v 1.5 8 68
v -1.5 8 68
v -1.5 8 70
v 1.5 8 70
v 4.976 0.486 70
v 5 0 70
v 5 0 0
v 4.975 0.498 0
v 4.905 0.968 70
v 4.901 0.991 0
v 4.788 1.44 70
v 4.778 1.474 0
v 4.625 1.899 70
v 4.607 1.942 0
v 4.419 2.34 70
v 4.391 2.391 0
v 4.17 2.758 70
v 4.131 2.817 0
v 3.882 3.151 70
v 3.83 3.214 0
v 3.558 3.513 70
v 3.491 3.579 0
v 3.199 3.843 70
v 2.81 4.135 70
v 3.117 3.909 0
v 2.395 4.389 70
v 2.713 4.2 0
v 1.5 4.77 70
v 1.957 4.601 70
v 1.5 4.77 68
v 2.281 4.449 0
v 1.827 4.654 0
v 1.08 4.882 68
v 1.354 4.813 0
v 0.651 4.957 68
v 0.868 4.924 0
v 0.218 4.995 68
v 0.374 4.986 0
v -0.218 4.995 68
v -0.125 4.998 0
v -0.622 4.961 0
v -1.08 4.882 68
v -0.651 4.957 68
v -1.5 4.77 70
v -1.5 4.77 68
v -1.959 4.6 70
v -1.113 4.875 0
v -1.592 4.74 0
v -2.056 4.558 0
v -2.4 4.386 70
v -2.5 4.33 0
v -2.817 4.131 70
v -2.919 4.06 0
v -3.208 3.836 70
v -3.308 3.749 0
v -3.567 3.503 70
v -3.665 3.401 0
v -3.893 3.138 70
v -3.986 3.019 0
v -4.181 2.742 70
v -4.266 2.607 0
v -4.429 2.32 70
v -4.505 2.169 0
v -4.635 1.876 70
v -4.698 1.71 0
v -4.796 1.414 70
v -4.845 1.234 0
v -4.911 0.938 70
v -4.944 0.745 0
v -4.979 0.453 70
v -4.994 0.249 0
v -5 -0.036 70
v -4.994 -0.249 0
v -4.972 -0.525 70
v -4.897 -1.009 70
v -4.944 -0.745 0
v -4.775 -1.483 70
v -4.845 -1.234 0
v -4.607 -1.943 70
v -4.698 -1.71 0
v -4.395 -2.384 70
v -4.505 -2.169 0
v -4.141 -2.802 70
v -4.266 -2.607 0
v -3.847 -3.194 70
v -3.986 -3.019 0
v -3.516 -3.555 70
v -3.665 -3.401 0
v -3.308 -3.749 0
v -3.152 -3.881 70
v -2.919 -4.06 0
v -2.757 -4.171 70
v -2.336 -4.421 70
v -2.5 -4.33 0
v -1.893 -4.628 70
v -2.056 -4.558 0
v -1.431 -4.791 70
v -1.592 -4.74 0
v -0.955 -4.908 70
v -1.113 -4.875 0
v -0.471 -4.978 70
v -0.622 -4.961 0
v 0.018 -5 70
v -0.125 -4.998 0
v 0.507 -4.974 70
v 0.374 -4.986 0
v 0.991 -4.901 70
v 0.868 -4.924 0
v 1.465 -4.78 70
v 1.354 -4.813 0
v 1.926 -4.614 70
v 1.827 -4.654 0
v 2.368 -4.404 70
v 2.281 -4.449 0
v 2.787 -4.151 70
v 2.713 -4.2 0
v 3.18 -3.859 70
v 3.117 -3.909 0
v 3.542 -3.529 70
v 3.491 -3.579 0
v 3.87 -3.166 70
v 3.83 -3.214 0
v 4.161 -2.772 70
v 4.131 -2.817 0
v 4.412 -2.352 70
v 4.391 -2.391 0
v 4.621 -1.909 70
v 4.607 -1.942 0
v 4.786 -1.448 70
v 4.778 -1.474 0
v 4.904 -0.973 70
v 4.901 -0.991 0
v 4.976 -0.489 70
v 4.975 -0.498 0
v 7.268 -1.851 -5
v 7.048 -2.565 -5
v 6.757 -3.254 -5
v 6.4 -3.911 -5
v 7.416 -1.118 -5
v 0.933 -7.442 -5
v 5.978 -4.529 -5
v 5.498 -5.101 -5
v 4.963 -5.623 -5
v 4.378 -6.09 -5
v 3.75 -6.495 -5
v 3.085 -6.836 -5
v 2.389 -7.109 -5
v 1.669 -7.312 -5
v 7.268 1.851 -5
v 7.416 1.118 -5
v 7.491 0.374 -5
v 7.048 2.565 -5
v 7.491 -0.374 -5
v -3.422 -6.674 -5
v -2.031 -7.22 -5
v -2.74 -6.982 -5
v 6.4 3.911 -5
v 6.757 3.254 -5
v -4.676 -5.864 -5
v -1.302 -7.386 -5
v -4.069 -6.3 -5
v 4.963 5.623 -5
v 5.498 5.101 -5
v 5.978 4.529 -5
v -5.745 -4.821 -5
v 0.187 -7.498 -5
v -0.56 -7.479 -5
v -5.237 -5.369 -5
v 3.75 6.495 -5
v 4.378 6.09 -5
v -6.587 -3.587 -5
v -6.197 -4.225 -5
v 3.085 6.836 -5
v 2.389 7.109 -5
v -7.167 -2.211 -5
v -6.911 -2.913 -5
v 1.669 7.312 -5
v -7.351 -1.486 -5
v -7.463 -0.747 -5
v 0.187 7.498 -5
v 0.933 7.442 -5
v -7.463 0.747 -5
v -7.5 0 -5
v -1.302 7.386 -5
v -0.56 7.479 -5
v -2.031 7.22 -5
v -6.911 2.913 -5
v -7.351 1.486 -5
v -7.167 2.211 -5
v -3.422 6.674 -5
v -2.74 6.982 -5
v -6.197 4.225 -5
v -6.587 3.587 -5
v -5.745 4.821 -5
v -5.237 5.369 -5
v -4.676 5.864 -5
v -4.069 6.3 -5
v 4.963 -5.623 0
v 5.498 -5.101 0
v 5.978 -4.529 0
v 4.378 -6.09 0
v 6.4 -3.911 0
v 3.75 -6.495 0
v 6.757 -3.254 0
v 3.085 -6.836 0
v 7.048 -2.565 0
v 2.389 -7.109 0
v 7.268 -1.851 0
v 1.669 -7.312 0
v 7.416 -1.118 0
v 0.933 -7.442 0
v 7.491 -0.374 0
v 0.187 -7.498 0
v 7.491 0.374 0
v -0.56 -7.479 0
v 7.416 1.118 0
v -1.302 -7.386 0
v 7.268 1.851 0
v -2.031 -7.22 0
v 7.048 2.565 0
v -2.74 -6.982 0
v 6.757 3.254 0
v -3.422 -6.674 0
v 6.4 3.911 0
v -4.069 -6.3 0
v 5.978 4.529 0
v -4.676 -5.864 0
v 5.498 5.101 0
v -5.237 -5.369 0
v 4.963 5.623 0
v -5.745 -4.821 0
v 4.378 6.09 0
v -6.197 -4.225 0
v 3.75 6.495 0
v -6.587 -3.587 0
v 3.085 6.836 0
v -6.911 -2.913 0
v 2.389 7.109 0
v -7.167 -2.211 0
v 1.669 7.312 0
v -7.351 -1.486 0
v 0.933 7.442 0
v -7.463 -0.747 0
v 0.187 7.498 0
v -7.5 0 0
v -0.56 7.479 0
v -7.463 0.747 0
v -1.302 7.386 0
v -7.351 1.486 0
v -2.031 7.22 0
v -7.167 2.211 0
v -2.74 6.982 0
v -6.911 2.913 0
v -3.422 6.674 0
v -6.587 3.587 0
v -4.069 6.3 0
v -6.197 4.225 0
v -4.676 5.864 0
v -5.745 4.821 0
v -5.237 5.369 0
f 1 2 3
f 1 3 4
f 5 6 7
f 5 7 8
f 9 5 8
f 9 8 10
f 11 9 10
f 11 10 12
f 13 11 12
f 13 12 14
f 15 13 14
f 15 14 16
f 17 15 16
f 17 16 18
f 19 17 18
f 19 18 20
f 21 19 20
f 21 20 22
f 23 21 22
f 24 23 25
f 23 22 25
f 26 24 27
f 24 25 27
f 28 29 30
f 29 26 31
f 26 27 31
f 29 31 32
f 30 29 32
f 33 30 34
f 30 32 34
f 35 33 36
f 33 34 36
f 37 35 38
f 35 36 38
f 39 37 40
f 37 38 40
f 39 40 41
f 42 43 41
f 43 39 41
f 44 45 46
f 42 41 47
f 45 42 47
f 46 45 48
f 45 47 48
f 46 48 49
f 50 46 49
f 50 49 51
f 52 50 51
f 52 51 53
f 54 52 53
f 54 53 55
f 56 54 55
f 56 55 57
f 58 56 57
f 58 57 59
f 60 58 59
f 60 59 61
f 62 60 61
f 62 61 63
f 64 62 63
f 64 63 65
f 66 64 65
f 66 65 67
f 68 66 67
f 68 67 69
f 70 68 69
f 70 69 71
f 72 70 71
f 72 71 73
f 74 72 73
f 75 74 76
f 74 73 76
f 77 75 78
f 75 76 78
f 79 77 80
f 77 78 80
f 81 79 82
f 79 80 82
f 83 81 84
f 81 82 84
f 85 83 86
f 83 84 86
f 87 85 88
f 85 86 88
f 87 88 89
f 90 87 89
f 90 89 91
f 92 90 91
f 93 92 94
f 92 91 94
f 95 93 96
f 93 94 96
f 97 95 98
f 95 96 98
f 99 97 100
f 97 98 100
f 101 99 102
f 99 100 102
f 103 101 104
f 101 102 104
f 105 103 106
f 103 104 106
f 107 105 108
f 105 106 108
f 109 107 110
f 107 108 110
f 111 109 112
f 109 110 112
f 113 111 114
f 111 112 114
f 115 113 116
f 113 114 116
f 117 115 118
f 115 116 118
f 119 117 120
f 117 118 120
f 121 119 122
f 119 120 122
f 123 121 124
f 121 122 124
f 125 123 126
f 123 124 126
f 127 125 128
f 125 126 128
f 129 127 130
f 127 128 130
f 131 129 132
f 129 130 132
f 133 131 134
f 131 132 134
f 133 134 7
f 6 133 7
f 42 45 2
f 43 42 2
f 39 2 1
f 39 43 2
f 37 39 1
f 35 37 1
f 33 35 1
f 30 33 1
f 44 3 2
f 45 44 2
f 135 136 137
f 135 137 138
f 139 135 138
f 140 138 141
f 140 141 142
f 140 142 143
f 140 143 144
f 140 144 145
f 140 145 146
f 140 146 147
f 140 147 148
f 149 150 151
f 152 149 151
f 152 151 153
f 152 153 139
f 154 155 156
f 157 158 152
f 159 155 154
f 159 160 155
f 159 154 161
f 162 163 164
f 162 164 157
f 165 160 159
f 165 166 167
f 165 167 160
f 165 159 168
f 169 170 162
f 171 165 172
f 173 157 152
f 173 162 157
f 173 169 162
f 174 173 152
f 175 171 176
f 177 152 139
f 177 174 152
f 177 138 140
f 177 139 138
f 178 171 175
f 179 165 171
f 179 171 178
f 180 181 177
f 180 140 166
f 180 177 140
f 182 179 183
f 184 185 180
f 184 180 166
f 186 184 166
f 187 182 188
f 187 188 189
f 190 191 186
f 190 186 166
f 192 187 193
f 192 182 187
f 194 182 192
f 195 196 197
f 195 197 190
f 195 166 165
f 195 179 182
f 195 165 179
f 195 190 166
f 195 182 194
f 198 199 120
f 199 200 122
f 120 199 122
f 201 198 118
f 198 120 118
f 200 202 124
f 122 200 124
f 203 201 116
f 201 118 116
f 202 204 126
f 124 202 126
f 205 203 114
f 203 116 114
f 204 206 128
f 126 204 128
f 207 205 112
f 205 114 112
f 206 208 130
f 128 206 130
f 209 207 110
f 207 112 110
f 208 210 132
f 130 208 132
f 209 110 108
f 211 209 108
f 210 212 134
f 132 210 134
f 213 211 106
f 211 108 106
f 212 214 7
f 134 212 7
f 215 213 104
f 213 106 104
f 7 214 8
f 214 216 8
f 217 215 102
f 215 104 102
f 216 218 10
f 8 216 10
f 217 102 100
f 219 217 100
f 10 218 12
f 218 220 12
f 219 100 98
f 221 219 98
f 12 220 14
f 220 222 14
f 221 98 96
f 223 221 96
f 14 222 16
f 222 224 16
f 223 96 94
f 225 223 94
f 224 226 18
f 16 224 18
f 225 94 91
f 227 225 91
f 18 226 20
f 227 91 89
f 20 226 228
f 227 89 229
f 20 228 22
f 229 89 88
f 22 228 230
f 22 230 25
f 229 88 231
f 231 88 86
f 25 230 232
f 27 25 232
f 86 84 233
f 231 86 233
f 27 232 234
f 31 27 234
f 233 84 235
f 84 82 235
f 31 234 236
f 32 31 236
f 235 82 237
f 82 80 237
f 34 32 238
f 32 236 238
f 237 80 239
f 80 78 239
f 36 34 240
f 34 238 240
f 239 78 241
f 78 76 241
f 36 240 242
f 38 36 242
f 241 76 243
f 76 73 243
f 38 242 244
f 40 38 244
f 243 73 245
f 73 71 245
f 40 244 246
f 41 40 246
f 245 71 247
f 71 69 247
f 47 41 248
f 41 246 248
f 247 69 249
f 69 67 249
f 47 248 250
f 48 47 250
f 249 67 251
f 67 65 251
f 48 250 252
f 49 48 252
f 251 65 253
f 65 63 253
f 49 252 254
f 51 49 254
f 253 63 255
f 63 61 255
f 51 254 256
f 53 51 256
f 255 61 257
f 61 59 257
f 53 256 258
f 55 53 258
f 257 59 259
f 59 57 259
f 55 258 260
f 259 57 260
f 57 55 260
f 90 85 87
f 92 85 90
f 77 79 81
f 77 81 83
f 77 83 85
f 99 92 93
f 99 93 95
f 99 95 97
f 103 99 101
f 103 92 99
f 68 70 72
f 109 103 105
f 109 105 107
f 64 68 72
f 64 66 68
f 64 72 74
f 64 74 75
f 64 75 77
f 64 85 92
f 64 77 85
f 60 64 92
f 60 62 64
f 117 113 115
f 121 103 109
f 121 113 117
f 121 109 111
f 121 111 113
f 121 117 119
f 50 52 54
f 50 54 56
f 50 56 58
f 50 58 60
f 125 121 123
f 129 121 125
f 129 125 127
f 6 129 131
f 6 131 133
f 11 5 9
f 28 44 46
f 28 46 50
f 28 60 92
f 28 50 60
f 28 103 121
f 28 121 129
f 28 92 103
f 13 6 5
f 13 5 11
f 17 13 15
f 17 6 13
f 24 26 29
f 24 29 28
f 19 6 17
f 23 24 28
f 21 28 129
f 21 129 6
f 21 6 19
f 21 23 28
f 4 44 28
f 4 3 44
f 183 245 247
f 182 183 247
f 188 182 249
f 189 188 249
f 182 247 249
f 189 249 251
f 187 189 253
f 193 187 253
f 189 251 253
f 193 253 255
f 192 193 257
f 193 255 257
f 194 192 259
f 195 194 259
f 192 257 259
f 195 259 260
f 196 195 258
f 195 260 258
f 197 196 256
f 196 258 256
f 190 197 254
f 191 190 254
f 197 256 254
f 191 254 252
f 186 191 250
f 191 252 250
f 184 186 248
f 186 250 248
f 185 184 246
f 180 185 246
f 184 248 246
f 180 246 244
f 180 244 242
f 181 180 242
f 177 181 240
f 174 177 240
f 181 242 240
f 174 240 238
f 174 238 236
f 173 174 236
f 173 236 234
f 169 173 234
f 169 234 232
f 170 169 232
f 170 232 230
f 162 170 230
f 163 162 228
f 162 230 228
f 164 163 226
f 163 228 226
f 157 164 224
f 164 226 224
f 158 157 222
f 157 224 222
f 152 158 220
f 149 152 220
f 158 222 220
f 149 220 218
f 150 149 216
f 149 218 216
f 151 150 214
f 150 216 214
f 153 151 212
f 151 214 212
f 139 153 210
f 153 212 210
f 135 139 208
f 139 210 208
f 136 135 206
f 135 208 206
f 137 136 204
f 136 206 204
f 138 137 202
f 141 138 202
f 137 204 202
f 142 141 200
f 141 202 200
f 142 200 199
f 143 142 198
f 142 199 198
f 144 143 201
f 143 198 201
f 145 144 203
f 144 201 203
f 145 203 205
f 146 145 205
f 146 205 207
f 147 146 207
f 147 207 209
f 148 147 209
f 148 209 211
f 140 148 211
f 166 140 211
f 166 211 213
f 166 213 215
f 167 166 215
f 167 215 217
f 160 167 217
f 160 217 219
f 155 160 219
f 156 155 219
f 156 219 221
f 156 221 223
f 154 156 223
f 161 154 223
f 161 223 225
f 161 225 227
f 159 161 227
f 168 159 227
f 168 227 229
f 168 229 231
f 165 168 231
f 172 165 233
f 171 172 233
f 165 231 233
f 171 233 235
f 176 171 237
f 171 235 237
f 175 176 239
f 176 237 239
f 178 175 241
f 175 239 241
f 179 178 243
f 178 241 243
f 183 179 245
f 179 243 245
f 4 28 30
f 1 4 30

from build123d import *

# Parameters (mm, degrees)
IZIM1_R                     = 5
Y_KSEKLIK_EKSTR_ZYON1_DEPTH = 70
IZIM2_R                     = 7.5
Y_KSEKLIK_EKSTR_ZYON2_DEPTH = 5
IZIM3_W                     = 3
IZIM3_H                     = 2
Y_KSEKLIK_EKSTR_ZYON3_DEPTH = 8


with BuildPart() as part:
    # Çizim1 → Yükseklik-Ekstrüzyon1 (new body)
    with BuildSketch(Plane.XY):
        Circle(IZIM1_R)
    extrude(amount=Y_KSEKLIK_EKSTR_ZYON1_DEPTH)

    # Çizim2 → Yükseklik-Ekstrüzyon2 (add)
    with BuildSketch(Plane(origin=(0, 0, 0), x_dir=(-1, 0, 0), z_dir=(0, 0, -1))):
        Circle(IZIM2_R)
    extrude(amount=Y_KSEKLIK_EKSTR_ZYON2_DEPTH)

    # Çizim3 → Yükseklik-Ekstrüzyon3 (add)
    with BuildSketch(Plane(origin=(0, 0, 0), x_dir=(1, 0, 0), z_dir=(0, 1, 0))):
        with Locations((0, -69)):
            Rectangle(IZIM3_W, IZIM3_H)
    extrude(amount=Y_KSEKLIK_EKSTR_ZYON3_DEPTH)


solid = part.part
